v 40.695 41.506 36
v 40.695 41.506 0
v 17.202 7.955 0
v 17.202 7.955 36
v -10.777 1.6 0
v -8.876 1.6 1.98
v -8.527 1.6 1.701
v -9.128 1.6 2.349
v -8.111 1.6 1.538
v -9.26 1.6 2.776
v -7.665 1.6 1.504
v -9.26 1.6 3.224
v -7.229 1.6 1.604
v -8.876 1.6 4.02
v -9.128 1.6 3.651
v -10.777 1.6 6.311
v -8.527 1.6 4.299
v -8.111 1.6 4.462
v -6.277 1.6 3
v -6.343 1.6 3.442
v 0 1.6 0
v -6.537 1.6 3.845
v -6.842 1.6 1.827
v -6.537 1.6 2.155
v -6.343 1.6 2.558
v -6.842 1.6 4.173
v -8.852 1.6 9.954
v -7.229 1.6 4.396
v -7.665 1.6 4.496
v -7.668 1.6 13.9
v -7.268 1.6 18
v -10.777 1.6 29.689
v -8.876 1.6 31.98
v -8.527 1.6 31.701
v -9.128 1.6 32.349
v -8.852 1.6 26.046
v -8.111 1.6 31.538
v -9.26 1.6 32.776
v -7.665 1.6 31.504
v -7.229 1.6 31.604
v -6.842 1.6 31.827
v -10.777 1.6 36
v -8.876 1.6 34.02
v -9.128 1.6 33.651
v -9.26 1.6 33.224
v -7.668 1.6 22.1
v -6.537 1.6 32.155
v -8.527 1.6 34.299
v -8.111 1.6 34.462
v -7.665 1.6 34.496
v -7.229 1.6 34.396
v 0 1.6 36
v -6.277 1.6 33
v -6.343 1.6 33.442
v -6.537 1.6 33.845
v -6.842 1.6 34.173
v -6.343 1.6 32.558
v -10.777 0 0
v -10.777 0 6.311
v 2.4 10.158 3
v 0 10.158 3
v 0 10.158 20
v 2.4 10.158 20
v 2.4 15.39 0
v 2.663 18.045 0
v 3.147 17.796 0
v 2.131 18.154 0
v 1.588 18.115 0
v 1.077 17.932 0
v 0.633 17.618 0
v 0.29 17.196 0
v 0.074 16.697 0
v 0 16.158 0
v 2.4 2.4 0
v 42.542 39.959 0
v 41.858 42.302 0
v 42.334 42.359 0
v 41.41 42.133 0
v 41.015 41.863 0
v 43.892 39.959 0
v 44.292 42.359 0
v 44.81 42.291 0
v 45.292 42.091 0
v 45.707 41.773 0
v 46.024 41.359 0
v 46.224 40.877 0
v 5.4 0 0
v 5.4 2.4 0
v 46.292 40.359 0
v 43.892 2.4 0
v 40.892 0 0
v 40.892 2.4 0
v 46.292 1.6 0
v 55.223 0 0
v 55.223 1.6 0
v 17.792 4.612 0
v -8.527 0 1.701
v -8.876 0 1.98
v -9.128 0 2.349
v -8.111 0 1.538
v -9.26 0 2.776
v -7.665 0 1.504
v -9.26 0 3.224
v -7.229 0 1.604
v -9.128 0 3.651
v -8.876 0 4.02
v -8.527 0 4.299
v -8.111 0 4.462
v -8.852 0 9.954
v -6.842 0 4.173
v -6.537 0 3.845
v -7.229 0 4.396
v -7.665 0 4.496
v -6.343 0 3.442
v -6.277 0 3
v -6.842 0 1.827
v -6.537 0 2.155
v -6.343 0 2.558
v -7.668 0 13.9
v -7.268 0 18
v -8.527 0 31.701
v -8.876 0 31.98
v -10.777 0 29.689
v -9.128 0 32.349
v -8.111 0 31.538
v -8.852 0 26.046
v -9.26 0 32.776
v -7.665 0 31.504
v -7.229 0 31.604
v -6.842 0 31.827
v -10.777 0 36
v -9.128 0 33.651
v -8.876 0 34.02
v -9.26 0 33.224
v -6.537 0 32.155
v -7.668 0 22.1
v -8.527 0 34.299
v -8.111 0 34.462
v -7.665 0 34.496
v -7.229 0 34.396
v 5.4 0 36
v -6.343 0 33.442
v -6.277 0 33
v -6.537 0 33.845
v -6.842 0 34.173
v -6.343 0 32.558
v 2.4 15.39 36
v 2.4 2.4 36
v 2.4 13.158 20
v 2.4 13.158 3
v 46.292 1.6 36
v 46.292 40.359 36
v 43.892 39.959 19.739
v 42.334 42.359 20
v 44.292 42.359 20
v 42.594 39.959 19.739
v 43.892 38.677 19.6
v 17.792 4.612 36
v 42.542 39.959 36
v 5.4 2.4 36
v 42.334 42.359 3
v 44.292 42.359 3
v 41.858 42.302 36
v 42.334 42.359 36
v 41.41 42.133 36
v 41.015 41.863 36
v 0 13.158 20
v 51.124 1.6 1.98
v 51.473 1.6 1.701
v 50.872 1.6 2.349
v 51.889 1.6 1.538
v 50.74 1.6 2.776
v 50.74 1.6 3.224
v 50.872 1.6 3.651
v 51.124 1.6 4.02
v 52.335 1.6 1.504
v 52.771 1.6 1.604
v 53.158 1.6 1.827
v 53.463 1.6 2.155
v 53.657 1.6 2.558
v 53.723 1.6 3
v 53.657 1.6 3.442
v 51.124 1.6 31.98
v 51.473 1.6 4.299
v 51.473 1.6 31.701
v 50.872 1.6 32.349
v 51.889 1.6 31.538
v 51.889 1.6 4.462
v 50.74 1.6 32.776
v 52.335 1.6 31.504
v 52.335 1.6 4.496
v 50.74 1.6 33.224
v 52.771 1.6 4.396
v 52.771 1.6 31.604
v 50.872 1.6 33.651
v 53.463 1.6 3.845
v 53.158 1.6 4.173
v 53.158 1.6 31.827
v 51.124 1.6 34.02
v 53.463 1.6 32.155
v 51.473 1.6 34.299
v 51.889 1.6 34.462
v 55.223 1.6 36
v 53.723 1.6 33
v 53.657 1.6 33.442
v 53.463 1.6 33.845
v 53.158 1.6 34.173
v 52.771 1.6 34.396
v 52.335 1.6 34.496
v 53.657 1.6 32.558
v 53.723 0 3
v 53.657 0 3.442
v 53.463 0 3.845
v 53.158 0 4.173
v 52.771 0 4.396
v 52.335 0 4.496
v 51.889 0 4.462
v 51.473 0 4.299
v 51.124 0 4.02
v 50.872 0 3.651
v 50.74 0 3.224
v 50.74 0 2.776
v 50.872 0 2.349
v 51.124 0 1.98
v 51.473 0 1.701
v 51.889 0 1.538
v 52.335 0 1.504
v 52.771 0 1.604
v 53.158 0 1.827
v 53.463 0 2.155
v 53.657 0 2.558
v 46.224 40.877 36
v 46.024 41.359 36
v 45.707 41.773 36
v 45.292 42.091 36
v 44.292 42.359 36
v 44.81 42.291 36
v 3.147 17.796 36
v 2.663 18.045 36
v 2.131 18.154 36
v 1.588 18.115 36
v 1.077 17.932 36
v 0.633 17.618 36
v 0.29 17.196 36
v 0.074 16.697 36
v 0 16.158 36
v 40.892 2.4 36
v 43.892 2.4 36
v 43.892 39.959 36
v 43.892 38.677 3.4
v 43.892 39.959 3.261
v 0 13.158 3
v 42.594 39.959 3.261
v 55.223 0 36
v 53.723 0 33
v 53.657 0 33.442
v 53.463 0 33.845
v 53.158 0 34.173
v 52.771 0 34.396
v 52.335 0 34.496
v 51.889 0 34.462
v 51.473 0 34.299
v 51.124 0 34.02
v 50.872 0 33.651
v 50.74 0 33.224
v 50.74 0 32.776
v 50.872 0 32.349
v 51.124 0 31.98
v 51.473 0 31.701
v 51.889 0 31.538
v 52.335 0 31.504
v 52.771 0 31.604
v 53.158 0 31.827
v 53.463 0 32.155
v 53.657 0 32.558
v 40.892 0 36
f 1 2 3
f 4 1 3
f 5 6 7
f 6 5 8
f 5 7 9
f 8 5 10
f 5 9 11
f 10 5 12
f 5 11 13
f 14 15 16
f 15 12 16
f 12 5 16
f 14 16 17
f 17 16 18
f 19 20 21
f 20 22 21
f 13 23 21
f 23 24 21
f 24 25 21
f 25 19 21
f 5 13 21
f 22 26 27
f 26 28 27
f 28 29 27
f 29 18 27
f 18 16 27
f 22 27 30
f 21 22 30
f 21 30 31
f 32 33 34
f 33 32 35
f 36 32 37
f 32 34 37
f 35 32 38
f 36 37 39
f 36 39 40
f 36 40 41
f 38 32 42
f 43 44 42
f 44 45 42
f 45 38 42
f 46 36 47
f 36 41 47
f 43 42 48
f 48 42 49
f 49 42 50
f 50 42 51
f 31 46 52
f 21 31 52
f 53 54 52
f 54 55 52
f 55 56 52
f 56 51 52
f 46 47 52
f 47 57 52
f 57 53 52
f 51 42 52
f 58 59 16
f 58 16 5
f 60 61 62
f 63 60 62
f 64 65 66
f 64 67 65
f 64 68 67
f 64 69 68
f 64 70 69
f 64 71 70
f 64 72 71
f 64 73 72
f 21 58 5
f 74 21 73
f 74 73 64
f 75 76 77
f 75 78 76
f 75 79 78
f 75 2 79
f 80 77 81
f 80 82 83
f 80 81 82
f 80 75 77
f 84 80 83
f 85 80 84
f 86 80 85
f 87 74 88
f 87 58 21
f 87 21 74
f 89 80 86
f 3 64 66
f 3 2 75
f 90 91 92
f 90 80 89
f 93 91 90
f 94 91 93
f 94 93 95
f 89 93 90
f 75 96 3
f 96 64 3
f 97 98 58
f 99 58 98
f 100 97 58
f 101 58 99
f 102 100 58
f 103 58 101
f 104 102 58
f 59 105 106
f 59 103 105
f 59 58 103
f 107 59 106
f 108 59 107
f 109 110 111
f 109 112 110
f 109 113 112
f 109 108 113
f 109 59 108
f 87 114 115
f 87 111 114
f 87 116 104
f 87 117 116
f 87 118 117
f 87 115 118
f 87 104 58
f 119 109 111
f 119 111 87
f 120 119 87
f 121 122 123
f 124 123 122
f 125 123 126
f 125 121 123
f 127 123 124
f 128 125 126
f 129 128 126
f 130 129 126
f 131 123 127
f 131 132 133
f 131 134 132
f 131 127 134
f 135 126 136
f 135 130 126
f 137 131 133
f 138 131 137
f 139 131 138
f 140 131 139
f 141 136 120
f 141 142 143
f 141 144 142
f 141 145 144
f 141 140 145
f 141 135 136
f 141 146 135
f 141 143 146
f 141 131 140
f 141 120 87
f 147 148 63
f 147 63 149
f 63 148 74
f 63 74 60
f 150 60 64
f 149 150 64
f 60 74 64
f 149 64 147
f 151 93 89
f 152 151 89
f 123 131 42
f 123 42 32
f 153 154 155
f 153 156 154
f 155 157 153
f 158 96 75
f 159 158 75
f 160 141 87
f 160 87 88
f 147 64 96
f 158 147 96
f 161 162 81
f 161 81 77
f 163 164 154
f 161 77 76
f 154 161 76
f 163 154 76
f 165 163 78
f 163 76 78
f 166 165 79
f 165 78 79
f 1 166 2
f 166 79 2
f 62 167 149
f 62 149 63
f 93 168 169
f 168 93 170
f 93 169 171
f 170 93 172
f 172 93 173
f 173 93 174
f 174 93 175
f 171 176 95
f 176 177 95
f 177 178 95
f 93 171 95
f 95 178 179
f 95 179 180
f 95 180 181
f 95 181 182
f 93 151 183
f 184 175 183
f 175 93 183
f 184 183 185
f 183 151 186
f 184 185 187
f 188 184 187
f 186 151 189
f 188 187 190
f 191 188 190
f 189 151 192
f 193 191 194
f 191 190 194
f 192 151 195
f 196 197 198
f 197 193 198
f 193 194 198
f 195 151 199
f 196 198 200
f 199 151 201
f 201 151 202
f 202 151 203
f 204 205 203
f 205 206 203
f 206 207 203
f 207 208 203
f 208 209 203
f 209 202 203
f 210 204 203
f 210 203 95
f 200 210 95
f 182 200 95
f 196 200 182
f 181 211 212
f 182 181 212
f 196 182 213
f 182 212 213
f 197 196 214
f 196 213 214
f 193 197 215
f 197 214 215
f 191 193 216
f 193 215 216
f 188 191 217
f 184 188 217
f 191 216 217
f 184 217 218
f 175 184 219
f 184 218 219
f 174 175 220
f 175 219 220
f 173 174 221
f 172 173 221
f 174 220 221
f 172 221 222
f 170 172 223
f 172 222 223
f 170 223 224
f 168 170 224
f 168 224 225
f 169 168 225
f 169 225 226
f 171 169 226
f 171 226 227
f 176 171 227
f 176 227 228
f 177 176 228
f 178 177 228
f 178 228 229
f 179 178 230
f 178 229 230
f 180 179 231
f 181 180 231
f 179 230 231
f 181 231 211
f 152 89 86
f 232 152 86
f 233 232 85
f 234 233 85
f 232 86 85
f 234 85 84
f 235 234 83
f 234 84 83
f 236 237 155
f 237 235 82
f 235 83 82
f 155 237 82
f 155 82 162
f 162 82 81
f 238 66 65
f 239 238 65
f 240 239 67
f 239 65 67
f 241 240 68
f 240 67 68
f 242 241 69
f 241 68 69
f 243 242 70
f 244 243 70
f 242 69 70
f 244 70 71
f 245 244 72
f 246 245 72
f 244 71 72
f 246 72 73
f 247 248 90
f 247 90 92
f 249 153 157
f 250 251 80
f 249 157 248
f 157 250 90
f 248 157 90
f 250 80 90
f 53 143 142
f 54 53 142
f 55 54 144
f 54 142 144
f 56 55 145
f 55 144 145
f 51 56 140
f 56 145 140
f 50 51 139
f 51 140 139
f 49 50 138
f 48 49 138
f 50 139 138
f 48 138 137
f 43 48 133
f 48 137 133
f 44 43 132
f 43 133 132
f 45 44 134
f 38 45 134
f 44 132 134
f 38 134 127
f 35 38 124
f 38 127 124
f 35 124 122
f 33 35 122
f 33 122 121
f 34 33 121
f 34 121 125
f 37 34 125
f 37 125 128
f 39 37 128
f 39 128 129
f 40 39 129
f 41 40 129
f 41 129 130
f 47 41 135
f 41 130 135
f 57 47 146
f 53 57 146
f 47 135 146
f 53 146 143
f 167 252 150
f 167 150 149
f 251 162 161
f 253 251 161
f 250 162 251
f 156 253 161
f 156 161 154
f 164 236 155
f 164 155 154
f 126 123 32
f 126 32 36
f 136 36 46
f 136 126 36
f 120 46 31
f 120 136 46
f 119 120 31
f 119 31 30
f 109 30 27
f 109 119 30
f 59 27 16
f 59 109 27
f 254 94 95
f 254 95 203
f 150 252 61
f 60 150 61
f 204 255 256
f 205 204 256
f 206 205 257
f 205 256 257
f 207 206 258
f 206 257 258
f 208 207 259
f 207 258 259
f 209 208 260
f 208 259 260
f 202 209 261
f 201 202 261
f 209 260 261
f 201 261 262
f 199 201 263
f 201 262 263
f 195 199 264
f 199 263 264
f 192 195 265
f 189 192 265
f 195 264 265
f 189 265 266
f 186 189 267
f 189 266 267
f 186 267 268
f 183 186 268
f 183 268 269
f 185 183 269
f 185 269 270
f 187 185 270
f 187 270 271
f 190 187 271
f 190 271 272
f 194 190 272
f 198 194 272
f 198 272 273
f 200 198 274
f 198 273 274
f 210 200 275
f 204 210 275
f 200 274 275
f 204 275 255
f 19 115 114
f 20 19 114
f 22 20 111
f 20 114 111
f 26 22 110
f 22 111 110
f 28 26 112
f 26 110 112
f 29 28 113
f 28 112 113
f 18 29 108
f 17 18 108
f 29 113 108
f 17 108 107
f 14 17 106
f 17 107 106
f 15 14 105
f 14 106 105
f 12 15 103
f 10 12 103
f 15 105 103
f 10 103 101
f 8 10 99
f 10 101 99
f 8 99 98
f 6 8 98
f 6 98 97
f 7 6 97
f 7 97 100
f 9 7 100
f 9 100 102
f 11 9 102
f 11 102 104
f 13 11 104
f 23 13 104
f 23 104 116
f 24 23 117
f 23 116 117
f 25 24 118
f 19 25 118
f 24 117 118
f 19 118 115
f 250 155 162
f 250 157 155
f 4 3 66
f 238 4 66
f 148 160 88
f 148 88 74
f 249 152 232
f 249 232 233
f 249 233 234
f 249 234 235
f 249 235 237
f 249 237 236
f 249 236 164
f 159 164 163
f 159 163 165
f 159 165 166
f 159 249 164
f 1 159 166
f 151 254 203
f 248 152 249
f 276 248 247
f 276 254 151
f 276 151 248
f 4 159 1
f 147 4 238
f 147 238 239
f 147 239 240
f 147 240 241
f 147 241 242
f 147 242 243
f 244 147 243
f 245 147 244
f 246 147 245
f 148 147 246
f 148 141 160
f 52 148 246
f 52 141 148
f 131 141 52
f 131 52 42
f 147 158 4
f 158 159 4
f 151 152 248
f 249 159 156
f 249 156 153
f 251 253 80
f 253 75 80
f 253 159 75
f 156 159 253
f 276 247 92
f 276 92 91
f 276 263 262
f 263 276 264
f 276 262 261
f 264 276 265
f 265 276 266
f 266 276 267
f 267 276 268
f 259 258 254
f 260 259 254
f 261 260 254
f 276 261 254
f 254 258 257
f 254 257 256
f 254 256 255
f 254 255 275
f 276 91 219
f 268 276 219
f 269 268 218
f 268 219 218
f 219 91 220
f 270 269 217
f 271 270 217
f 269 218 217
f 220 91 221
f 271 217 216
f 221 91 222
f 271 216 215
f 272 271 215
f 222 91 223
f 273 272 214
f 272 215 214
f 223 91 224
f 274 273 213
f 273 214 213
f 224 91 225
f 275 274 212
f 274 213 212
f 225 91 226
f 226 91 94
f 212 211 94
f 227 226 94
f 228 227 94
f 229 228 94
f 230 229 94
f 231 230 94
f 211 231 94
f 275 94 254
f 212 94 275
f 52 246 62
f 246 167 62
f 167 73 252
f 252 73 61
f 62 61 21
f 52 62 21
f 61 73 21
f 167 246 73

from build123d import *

# Parameters (mm, degrees)
F1_DEPTH = 36
F2_R     = 1.5
F3_DEPTH = 1.6
F4_W     = 3
F4_H     = 17
F5_DEPTH = 3
F6_W     = 1.9588658989
F6_H     = 17
F7_DEPTH = 4
F7_TAPER = 6.2


with BuildPart() as f1:
    # F0 (on Top) → F1 (new body)
    with BuildSketch(Plane.XY):
        with BuildLine():
            Line((0, 16.1580357461), (0, 0))
            Line((0, 0), (5.4, 0))
            Line((5.4, 0), (5.4, 2.4))
            Line((5.4, 2.4), (2.4, 2.4))
            Line((2.4, 2.4), (2.4, 15.3896428953))
            Line((2.4, 15.3896428953), (17.7915743891, 4.6123464831))
            Line((17.7915743891, 4.6123464831), (42.5417641781, 39.9592806968))
            Line((42.5417641781, 39.9592806968), (43.8924032568, 39.9592806968))
            Line((43.8924032568, 39.9592806968), (43.8924032568, 2.4))
            Line((43.8924032568, 2.4), (40.8924032568, 2.4))
            Line((40.8924032568, 2.4), (40.8924032568, 0))
            Line((40.8924032568, 0), (46.2924032568, 0))
            Line((46.2924032568, 0), (46.2924032568, 40.3592806968))
            ThreePointArc((46.2924032568, 40.3592806968), (45.7066168192, 41.7734942591), (44.2924032568, 42.3592806968))
            Line((44.2924032568, 42.3592806968), (42.3335373579, 42.3592806968))
            ThreePointArc((42.3335373579, 42.3592806968), (41.4100401314, 42.1333023631), (40.6952332693, 41.5064335695))
            Line((40.6952332693, 41.5064335695), (17.2021929301, 7.9548948366))
            Line((17.2021929301, 7.9548948366), (3.1471528727, 17.7963398346))
            ThreePointArc((3.1471528727, 17.7963398346), (1.0765027735, 17.9320574124), (0, 16.1580357461))
        make_face()
    extrude(amount=F1_DEPTH)

    # F2 (on face) → F3 (join)
    with BuildSketch(Plane.XZ):
        with BuildLine():
            Line((-7.7767788619, 0), (0, 0))
            Line((0, 0), (0, 36))
            Line((0, 36), (-10.7767788619, 36))
            Line((-10.7767788619, 36), (-10.7767788619, 29.6889703104))
            ThreePointArc((-10.7767788619, 29.6889703104), (-8.1641973062, 24.1021049808), (-7.2681161721, 18))
            ThreePointArc((-7.2681161721, 18), (-8.1641973062, 11.8978950192), (-10.7767788619, 6.3110296896))
            Line((-10.7767788619, 6.3110296896), (-10.7767788619, 3))
            Line((-10.7767788619, 3), (-10.7767788619, 0))
            Line((-10.7767788619, 0), (-7.7767788619, 0))
        make_face()
        with Locations((-7.7767788619, 3)):
            Circle(F2_R, mode=Mode.SUBTRACT)
        with Locations((-7.7767788619, 33)):
            Circle(F2_R, mode=Mode.SUBTRACT)
        Polygon((42.1804301441, 36), (42.1804301441, 0), (46.2169349194, 0), (55.2232211381, 0), (55.2232211381, 36), align=None)
        with Locations((52.2232211381, 3)):
            Circle(F2_R, mode=Mode.SUBTRACT)
        with Locations((52.2232211381, 33)):
            Circle(F2_R, mode=Mode.SUBTRACT)
    extrude(amount=-F3_DEPTH)

    # F4 (on face) → F5 (cut)
    with BuildSketch(Plane(origin=(0, 0, 0), x_dir=(0, -1, 0), z_dir=(-1, 0, 0))):
        with Locations((-11.6580357461, 11.5)):
            Rectangle(F4_W, F4_H)
    extrude(amount=-F5_DEPTH, mode=Mode.SUBTRACT)

    # F6 (on face) → F7 (cut)
    with BuildSketch(Plane(origin=(0, 42.3592806968, 0), x_dir=(-1, 0, 0), z_dir=(0, 1, 0))):
        with Locations((-43.3129703074, 11.5)):
            Rectangle(F6_W, F6_H)
    extrude(amount=-F7_DEPTH, taper=F7_TAPER, mode=Mode.SUBTRACT)


solid = f1.part
